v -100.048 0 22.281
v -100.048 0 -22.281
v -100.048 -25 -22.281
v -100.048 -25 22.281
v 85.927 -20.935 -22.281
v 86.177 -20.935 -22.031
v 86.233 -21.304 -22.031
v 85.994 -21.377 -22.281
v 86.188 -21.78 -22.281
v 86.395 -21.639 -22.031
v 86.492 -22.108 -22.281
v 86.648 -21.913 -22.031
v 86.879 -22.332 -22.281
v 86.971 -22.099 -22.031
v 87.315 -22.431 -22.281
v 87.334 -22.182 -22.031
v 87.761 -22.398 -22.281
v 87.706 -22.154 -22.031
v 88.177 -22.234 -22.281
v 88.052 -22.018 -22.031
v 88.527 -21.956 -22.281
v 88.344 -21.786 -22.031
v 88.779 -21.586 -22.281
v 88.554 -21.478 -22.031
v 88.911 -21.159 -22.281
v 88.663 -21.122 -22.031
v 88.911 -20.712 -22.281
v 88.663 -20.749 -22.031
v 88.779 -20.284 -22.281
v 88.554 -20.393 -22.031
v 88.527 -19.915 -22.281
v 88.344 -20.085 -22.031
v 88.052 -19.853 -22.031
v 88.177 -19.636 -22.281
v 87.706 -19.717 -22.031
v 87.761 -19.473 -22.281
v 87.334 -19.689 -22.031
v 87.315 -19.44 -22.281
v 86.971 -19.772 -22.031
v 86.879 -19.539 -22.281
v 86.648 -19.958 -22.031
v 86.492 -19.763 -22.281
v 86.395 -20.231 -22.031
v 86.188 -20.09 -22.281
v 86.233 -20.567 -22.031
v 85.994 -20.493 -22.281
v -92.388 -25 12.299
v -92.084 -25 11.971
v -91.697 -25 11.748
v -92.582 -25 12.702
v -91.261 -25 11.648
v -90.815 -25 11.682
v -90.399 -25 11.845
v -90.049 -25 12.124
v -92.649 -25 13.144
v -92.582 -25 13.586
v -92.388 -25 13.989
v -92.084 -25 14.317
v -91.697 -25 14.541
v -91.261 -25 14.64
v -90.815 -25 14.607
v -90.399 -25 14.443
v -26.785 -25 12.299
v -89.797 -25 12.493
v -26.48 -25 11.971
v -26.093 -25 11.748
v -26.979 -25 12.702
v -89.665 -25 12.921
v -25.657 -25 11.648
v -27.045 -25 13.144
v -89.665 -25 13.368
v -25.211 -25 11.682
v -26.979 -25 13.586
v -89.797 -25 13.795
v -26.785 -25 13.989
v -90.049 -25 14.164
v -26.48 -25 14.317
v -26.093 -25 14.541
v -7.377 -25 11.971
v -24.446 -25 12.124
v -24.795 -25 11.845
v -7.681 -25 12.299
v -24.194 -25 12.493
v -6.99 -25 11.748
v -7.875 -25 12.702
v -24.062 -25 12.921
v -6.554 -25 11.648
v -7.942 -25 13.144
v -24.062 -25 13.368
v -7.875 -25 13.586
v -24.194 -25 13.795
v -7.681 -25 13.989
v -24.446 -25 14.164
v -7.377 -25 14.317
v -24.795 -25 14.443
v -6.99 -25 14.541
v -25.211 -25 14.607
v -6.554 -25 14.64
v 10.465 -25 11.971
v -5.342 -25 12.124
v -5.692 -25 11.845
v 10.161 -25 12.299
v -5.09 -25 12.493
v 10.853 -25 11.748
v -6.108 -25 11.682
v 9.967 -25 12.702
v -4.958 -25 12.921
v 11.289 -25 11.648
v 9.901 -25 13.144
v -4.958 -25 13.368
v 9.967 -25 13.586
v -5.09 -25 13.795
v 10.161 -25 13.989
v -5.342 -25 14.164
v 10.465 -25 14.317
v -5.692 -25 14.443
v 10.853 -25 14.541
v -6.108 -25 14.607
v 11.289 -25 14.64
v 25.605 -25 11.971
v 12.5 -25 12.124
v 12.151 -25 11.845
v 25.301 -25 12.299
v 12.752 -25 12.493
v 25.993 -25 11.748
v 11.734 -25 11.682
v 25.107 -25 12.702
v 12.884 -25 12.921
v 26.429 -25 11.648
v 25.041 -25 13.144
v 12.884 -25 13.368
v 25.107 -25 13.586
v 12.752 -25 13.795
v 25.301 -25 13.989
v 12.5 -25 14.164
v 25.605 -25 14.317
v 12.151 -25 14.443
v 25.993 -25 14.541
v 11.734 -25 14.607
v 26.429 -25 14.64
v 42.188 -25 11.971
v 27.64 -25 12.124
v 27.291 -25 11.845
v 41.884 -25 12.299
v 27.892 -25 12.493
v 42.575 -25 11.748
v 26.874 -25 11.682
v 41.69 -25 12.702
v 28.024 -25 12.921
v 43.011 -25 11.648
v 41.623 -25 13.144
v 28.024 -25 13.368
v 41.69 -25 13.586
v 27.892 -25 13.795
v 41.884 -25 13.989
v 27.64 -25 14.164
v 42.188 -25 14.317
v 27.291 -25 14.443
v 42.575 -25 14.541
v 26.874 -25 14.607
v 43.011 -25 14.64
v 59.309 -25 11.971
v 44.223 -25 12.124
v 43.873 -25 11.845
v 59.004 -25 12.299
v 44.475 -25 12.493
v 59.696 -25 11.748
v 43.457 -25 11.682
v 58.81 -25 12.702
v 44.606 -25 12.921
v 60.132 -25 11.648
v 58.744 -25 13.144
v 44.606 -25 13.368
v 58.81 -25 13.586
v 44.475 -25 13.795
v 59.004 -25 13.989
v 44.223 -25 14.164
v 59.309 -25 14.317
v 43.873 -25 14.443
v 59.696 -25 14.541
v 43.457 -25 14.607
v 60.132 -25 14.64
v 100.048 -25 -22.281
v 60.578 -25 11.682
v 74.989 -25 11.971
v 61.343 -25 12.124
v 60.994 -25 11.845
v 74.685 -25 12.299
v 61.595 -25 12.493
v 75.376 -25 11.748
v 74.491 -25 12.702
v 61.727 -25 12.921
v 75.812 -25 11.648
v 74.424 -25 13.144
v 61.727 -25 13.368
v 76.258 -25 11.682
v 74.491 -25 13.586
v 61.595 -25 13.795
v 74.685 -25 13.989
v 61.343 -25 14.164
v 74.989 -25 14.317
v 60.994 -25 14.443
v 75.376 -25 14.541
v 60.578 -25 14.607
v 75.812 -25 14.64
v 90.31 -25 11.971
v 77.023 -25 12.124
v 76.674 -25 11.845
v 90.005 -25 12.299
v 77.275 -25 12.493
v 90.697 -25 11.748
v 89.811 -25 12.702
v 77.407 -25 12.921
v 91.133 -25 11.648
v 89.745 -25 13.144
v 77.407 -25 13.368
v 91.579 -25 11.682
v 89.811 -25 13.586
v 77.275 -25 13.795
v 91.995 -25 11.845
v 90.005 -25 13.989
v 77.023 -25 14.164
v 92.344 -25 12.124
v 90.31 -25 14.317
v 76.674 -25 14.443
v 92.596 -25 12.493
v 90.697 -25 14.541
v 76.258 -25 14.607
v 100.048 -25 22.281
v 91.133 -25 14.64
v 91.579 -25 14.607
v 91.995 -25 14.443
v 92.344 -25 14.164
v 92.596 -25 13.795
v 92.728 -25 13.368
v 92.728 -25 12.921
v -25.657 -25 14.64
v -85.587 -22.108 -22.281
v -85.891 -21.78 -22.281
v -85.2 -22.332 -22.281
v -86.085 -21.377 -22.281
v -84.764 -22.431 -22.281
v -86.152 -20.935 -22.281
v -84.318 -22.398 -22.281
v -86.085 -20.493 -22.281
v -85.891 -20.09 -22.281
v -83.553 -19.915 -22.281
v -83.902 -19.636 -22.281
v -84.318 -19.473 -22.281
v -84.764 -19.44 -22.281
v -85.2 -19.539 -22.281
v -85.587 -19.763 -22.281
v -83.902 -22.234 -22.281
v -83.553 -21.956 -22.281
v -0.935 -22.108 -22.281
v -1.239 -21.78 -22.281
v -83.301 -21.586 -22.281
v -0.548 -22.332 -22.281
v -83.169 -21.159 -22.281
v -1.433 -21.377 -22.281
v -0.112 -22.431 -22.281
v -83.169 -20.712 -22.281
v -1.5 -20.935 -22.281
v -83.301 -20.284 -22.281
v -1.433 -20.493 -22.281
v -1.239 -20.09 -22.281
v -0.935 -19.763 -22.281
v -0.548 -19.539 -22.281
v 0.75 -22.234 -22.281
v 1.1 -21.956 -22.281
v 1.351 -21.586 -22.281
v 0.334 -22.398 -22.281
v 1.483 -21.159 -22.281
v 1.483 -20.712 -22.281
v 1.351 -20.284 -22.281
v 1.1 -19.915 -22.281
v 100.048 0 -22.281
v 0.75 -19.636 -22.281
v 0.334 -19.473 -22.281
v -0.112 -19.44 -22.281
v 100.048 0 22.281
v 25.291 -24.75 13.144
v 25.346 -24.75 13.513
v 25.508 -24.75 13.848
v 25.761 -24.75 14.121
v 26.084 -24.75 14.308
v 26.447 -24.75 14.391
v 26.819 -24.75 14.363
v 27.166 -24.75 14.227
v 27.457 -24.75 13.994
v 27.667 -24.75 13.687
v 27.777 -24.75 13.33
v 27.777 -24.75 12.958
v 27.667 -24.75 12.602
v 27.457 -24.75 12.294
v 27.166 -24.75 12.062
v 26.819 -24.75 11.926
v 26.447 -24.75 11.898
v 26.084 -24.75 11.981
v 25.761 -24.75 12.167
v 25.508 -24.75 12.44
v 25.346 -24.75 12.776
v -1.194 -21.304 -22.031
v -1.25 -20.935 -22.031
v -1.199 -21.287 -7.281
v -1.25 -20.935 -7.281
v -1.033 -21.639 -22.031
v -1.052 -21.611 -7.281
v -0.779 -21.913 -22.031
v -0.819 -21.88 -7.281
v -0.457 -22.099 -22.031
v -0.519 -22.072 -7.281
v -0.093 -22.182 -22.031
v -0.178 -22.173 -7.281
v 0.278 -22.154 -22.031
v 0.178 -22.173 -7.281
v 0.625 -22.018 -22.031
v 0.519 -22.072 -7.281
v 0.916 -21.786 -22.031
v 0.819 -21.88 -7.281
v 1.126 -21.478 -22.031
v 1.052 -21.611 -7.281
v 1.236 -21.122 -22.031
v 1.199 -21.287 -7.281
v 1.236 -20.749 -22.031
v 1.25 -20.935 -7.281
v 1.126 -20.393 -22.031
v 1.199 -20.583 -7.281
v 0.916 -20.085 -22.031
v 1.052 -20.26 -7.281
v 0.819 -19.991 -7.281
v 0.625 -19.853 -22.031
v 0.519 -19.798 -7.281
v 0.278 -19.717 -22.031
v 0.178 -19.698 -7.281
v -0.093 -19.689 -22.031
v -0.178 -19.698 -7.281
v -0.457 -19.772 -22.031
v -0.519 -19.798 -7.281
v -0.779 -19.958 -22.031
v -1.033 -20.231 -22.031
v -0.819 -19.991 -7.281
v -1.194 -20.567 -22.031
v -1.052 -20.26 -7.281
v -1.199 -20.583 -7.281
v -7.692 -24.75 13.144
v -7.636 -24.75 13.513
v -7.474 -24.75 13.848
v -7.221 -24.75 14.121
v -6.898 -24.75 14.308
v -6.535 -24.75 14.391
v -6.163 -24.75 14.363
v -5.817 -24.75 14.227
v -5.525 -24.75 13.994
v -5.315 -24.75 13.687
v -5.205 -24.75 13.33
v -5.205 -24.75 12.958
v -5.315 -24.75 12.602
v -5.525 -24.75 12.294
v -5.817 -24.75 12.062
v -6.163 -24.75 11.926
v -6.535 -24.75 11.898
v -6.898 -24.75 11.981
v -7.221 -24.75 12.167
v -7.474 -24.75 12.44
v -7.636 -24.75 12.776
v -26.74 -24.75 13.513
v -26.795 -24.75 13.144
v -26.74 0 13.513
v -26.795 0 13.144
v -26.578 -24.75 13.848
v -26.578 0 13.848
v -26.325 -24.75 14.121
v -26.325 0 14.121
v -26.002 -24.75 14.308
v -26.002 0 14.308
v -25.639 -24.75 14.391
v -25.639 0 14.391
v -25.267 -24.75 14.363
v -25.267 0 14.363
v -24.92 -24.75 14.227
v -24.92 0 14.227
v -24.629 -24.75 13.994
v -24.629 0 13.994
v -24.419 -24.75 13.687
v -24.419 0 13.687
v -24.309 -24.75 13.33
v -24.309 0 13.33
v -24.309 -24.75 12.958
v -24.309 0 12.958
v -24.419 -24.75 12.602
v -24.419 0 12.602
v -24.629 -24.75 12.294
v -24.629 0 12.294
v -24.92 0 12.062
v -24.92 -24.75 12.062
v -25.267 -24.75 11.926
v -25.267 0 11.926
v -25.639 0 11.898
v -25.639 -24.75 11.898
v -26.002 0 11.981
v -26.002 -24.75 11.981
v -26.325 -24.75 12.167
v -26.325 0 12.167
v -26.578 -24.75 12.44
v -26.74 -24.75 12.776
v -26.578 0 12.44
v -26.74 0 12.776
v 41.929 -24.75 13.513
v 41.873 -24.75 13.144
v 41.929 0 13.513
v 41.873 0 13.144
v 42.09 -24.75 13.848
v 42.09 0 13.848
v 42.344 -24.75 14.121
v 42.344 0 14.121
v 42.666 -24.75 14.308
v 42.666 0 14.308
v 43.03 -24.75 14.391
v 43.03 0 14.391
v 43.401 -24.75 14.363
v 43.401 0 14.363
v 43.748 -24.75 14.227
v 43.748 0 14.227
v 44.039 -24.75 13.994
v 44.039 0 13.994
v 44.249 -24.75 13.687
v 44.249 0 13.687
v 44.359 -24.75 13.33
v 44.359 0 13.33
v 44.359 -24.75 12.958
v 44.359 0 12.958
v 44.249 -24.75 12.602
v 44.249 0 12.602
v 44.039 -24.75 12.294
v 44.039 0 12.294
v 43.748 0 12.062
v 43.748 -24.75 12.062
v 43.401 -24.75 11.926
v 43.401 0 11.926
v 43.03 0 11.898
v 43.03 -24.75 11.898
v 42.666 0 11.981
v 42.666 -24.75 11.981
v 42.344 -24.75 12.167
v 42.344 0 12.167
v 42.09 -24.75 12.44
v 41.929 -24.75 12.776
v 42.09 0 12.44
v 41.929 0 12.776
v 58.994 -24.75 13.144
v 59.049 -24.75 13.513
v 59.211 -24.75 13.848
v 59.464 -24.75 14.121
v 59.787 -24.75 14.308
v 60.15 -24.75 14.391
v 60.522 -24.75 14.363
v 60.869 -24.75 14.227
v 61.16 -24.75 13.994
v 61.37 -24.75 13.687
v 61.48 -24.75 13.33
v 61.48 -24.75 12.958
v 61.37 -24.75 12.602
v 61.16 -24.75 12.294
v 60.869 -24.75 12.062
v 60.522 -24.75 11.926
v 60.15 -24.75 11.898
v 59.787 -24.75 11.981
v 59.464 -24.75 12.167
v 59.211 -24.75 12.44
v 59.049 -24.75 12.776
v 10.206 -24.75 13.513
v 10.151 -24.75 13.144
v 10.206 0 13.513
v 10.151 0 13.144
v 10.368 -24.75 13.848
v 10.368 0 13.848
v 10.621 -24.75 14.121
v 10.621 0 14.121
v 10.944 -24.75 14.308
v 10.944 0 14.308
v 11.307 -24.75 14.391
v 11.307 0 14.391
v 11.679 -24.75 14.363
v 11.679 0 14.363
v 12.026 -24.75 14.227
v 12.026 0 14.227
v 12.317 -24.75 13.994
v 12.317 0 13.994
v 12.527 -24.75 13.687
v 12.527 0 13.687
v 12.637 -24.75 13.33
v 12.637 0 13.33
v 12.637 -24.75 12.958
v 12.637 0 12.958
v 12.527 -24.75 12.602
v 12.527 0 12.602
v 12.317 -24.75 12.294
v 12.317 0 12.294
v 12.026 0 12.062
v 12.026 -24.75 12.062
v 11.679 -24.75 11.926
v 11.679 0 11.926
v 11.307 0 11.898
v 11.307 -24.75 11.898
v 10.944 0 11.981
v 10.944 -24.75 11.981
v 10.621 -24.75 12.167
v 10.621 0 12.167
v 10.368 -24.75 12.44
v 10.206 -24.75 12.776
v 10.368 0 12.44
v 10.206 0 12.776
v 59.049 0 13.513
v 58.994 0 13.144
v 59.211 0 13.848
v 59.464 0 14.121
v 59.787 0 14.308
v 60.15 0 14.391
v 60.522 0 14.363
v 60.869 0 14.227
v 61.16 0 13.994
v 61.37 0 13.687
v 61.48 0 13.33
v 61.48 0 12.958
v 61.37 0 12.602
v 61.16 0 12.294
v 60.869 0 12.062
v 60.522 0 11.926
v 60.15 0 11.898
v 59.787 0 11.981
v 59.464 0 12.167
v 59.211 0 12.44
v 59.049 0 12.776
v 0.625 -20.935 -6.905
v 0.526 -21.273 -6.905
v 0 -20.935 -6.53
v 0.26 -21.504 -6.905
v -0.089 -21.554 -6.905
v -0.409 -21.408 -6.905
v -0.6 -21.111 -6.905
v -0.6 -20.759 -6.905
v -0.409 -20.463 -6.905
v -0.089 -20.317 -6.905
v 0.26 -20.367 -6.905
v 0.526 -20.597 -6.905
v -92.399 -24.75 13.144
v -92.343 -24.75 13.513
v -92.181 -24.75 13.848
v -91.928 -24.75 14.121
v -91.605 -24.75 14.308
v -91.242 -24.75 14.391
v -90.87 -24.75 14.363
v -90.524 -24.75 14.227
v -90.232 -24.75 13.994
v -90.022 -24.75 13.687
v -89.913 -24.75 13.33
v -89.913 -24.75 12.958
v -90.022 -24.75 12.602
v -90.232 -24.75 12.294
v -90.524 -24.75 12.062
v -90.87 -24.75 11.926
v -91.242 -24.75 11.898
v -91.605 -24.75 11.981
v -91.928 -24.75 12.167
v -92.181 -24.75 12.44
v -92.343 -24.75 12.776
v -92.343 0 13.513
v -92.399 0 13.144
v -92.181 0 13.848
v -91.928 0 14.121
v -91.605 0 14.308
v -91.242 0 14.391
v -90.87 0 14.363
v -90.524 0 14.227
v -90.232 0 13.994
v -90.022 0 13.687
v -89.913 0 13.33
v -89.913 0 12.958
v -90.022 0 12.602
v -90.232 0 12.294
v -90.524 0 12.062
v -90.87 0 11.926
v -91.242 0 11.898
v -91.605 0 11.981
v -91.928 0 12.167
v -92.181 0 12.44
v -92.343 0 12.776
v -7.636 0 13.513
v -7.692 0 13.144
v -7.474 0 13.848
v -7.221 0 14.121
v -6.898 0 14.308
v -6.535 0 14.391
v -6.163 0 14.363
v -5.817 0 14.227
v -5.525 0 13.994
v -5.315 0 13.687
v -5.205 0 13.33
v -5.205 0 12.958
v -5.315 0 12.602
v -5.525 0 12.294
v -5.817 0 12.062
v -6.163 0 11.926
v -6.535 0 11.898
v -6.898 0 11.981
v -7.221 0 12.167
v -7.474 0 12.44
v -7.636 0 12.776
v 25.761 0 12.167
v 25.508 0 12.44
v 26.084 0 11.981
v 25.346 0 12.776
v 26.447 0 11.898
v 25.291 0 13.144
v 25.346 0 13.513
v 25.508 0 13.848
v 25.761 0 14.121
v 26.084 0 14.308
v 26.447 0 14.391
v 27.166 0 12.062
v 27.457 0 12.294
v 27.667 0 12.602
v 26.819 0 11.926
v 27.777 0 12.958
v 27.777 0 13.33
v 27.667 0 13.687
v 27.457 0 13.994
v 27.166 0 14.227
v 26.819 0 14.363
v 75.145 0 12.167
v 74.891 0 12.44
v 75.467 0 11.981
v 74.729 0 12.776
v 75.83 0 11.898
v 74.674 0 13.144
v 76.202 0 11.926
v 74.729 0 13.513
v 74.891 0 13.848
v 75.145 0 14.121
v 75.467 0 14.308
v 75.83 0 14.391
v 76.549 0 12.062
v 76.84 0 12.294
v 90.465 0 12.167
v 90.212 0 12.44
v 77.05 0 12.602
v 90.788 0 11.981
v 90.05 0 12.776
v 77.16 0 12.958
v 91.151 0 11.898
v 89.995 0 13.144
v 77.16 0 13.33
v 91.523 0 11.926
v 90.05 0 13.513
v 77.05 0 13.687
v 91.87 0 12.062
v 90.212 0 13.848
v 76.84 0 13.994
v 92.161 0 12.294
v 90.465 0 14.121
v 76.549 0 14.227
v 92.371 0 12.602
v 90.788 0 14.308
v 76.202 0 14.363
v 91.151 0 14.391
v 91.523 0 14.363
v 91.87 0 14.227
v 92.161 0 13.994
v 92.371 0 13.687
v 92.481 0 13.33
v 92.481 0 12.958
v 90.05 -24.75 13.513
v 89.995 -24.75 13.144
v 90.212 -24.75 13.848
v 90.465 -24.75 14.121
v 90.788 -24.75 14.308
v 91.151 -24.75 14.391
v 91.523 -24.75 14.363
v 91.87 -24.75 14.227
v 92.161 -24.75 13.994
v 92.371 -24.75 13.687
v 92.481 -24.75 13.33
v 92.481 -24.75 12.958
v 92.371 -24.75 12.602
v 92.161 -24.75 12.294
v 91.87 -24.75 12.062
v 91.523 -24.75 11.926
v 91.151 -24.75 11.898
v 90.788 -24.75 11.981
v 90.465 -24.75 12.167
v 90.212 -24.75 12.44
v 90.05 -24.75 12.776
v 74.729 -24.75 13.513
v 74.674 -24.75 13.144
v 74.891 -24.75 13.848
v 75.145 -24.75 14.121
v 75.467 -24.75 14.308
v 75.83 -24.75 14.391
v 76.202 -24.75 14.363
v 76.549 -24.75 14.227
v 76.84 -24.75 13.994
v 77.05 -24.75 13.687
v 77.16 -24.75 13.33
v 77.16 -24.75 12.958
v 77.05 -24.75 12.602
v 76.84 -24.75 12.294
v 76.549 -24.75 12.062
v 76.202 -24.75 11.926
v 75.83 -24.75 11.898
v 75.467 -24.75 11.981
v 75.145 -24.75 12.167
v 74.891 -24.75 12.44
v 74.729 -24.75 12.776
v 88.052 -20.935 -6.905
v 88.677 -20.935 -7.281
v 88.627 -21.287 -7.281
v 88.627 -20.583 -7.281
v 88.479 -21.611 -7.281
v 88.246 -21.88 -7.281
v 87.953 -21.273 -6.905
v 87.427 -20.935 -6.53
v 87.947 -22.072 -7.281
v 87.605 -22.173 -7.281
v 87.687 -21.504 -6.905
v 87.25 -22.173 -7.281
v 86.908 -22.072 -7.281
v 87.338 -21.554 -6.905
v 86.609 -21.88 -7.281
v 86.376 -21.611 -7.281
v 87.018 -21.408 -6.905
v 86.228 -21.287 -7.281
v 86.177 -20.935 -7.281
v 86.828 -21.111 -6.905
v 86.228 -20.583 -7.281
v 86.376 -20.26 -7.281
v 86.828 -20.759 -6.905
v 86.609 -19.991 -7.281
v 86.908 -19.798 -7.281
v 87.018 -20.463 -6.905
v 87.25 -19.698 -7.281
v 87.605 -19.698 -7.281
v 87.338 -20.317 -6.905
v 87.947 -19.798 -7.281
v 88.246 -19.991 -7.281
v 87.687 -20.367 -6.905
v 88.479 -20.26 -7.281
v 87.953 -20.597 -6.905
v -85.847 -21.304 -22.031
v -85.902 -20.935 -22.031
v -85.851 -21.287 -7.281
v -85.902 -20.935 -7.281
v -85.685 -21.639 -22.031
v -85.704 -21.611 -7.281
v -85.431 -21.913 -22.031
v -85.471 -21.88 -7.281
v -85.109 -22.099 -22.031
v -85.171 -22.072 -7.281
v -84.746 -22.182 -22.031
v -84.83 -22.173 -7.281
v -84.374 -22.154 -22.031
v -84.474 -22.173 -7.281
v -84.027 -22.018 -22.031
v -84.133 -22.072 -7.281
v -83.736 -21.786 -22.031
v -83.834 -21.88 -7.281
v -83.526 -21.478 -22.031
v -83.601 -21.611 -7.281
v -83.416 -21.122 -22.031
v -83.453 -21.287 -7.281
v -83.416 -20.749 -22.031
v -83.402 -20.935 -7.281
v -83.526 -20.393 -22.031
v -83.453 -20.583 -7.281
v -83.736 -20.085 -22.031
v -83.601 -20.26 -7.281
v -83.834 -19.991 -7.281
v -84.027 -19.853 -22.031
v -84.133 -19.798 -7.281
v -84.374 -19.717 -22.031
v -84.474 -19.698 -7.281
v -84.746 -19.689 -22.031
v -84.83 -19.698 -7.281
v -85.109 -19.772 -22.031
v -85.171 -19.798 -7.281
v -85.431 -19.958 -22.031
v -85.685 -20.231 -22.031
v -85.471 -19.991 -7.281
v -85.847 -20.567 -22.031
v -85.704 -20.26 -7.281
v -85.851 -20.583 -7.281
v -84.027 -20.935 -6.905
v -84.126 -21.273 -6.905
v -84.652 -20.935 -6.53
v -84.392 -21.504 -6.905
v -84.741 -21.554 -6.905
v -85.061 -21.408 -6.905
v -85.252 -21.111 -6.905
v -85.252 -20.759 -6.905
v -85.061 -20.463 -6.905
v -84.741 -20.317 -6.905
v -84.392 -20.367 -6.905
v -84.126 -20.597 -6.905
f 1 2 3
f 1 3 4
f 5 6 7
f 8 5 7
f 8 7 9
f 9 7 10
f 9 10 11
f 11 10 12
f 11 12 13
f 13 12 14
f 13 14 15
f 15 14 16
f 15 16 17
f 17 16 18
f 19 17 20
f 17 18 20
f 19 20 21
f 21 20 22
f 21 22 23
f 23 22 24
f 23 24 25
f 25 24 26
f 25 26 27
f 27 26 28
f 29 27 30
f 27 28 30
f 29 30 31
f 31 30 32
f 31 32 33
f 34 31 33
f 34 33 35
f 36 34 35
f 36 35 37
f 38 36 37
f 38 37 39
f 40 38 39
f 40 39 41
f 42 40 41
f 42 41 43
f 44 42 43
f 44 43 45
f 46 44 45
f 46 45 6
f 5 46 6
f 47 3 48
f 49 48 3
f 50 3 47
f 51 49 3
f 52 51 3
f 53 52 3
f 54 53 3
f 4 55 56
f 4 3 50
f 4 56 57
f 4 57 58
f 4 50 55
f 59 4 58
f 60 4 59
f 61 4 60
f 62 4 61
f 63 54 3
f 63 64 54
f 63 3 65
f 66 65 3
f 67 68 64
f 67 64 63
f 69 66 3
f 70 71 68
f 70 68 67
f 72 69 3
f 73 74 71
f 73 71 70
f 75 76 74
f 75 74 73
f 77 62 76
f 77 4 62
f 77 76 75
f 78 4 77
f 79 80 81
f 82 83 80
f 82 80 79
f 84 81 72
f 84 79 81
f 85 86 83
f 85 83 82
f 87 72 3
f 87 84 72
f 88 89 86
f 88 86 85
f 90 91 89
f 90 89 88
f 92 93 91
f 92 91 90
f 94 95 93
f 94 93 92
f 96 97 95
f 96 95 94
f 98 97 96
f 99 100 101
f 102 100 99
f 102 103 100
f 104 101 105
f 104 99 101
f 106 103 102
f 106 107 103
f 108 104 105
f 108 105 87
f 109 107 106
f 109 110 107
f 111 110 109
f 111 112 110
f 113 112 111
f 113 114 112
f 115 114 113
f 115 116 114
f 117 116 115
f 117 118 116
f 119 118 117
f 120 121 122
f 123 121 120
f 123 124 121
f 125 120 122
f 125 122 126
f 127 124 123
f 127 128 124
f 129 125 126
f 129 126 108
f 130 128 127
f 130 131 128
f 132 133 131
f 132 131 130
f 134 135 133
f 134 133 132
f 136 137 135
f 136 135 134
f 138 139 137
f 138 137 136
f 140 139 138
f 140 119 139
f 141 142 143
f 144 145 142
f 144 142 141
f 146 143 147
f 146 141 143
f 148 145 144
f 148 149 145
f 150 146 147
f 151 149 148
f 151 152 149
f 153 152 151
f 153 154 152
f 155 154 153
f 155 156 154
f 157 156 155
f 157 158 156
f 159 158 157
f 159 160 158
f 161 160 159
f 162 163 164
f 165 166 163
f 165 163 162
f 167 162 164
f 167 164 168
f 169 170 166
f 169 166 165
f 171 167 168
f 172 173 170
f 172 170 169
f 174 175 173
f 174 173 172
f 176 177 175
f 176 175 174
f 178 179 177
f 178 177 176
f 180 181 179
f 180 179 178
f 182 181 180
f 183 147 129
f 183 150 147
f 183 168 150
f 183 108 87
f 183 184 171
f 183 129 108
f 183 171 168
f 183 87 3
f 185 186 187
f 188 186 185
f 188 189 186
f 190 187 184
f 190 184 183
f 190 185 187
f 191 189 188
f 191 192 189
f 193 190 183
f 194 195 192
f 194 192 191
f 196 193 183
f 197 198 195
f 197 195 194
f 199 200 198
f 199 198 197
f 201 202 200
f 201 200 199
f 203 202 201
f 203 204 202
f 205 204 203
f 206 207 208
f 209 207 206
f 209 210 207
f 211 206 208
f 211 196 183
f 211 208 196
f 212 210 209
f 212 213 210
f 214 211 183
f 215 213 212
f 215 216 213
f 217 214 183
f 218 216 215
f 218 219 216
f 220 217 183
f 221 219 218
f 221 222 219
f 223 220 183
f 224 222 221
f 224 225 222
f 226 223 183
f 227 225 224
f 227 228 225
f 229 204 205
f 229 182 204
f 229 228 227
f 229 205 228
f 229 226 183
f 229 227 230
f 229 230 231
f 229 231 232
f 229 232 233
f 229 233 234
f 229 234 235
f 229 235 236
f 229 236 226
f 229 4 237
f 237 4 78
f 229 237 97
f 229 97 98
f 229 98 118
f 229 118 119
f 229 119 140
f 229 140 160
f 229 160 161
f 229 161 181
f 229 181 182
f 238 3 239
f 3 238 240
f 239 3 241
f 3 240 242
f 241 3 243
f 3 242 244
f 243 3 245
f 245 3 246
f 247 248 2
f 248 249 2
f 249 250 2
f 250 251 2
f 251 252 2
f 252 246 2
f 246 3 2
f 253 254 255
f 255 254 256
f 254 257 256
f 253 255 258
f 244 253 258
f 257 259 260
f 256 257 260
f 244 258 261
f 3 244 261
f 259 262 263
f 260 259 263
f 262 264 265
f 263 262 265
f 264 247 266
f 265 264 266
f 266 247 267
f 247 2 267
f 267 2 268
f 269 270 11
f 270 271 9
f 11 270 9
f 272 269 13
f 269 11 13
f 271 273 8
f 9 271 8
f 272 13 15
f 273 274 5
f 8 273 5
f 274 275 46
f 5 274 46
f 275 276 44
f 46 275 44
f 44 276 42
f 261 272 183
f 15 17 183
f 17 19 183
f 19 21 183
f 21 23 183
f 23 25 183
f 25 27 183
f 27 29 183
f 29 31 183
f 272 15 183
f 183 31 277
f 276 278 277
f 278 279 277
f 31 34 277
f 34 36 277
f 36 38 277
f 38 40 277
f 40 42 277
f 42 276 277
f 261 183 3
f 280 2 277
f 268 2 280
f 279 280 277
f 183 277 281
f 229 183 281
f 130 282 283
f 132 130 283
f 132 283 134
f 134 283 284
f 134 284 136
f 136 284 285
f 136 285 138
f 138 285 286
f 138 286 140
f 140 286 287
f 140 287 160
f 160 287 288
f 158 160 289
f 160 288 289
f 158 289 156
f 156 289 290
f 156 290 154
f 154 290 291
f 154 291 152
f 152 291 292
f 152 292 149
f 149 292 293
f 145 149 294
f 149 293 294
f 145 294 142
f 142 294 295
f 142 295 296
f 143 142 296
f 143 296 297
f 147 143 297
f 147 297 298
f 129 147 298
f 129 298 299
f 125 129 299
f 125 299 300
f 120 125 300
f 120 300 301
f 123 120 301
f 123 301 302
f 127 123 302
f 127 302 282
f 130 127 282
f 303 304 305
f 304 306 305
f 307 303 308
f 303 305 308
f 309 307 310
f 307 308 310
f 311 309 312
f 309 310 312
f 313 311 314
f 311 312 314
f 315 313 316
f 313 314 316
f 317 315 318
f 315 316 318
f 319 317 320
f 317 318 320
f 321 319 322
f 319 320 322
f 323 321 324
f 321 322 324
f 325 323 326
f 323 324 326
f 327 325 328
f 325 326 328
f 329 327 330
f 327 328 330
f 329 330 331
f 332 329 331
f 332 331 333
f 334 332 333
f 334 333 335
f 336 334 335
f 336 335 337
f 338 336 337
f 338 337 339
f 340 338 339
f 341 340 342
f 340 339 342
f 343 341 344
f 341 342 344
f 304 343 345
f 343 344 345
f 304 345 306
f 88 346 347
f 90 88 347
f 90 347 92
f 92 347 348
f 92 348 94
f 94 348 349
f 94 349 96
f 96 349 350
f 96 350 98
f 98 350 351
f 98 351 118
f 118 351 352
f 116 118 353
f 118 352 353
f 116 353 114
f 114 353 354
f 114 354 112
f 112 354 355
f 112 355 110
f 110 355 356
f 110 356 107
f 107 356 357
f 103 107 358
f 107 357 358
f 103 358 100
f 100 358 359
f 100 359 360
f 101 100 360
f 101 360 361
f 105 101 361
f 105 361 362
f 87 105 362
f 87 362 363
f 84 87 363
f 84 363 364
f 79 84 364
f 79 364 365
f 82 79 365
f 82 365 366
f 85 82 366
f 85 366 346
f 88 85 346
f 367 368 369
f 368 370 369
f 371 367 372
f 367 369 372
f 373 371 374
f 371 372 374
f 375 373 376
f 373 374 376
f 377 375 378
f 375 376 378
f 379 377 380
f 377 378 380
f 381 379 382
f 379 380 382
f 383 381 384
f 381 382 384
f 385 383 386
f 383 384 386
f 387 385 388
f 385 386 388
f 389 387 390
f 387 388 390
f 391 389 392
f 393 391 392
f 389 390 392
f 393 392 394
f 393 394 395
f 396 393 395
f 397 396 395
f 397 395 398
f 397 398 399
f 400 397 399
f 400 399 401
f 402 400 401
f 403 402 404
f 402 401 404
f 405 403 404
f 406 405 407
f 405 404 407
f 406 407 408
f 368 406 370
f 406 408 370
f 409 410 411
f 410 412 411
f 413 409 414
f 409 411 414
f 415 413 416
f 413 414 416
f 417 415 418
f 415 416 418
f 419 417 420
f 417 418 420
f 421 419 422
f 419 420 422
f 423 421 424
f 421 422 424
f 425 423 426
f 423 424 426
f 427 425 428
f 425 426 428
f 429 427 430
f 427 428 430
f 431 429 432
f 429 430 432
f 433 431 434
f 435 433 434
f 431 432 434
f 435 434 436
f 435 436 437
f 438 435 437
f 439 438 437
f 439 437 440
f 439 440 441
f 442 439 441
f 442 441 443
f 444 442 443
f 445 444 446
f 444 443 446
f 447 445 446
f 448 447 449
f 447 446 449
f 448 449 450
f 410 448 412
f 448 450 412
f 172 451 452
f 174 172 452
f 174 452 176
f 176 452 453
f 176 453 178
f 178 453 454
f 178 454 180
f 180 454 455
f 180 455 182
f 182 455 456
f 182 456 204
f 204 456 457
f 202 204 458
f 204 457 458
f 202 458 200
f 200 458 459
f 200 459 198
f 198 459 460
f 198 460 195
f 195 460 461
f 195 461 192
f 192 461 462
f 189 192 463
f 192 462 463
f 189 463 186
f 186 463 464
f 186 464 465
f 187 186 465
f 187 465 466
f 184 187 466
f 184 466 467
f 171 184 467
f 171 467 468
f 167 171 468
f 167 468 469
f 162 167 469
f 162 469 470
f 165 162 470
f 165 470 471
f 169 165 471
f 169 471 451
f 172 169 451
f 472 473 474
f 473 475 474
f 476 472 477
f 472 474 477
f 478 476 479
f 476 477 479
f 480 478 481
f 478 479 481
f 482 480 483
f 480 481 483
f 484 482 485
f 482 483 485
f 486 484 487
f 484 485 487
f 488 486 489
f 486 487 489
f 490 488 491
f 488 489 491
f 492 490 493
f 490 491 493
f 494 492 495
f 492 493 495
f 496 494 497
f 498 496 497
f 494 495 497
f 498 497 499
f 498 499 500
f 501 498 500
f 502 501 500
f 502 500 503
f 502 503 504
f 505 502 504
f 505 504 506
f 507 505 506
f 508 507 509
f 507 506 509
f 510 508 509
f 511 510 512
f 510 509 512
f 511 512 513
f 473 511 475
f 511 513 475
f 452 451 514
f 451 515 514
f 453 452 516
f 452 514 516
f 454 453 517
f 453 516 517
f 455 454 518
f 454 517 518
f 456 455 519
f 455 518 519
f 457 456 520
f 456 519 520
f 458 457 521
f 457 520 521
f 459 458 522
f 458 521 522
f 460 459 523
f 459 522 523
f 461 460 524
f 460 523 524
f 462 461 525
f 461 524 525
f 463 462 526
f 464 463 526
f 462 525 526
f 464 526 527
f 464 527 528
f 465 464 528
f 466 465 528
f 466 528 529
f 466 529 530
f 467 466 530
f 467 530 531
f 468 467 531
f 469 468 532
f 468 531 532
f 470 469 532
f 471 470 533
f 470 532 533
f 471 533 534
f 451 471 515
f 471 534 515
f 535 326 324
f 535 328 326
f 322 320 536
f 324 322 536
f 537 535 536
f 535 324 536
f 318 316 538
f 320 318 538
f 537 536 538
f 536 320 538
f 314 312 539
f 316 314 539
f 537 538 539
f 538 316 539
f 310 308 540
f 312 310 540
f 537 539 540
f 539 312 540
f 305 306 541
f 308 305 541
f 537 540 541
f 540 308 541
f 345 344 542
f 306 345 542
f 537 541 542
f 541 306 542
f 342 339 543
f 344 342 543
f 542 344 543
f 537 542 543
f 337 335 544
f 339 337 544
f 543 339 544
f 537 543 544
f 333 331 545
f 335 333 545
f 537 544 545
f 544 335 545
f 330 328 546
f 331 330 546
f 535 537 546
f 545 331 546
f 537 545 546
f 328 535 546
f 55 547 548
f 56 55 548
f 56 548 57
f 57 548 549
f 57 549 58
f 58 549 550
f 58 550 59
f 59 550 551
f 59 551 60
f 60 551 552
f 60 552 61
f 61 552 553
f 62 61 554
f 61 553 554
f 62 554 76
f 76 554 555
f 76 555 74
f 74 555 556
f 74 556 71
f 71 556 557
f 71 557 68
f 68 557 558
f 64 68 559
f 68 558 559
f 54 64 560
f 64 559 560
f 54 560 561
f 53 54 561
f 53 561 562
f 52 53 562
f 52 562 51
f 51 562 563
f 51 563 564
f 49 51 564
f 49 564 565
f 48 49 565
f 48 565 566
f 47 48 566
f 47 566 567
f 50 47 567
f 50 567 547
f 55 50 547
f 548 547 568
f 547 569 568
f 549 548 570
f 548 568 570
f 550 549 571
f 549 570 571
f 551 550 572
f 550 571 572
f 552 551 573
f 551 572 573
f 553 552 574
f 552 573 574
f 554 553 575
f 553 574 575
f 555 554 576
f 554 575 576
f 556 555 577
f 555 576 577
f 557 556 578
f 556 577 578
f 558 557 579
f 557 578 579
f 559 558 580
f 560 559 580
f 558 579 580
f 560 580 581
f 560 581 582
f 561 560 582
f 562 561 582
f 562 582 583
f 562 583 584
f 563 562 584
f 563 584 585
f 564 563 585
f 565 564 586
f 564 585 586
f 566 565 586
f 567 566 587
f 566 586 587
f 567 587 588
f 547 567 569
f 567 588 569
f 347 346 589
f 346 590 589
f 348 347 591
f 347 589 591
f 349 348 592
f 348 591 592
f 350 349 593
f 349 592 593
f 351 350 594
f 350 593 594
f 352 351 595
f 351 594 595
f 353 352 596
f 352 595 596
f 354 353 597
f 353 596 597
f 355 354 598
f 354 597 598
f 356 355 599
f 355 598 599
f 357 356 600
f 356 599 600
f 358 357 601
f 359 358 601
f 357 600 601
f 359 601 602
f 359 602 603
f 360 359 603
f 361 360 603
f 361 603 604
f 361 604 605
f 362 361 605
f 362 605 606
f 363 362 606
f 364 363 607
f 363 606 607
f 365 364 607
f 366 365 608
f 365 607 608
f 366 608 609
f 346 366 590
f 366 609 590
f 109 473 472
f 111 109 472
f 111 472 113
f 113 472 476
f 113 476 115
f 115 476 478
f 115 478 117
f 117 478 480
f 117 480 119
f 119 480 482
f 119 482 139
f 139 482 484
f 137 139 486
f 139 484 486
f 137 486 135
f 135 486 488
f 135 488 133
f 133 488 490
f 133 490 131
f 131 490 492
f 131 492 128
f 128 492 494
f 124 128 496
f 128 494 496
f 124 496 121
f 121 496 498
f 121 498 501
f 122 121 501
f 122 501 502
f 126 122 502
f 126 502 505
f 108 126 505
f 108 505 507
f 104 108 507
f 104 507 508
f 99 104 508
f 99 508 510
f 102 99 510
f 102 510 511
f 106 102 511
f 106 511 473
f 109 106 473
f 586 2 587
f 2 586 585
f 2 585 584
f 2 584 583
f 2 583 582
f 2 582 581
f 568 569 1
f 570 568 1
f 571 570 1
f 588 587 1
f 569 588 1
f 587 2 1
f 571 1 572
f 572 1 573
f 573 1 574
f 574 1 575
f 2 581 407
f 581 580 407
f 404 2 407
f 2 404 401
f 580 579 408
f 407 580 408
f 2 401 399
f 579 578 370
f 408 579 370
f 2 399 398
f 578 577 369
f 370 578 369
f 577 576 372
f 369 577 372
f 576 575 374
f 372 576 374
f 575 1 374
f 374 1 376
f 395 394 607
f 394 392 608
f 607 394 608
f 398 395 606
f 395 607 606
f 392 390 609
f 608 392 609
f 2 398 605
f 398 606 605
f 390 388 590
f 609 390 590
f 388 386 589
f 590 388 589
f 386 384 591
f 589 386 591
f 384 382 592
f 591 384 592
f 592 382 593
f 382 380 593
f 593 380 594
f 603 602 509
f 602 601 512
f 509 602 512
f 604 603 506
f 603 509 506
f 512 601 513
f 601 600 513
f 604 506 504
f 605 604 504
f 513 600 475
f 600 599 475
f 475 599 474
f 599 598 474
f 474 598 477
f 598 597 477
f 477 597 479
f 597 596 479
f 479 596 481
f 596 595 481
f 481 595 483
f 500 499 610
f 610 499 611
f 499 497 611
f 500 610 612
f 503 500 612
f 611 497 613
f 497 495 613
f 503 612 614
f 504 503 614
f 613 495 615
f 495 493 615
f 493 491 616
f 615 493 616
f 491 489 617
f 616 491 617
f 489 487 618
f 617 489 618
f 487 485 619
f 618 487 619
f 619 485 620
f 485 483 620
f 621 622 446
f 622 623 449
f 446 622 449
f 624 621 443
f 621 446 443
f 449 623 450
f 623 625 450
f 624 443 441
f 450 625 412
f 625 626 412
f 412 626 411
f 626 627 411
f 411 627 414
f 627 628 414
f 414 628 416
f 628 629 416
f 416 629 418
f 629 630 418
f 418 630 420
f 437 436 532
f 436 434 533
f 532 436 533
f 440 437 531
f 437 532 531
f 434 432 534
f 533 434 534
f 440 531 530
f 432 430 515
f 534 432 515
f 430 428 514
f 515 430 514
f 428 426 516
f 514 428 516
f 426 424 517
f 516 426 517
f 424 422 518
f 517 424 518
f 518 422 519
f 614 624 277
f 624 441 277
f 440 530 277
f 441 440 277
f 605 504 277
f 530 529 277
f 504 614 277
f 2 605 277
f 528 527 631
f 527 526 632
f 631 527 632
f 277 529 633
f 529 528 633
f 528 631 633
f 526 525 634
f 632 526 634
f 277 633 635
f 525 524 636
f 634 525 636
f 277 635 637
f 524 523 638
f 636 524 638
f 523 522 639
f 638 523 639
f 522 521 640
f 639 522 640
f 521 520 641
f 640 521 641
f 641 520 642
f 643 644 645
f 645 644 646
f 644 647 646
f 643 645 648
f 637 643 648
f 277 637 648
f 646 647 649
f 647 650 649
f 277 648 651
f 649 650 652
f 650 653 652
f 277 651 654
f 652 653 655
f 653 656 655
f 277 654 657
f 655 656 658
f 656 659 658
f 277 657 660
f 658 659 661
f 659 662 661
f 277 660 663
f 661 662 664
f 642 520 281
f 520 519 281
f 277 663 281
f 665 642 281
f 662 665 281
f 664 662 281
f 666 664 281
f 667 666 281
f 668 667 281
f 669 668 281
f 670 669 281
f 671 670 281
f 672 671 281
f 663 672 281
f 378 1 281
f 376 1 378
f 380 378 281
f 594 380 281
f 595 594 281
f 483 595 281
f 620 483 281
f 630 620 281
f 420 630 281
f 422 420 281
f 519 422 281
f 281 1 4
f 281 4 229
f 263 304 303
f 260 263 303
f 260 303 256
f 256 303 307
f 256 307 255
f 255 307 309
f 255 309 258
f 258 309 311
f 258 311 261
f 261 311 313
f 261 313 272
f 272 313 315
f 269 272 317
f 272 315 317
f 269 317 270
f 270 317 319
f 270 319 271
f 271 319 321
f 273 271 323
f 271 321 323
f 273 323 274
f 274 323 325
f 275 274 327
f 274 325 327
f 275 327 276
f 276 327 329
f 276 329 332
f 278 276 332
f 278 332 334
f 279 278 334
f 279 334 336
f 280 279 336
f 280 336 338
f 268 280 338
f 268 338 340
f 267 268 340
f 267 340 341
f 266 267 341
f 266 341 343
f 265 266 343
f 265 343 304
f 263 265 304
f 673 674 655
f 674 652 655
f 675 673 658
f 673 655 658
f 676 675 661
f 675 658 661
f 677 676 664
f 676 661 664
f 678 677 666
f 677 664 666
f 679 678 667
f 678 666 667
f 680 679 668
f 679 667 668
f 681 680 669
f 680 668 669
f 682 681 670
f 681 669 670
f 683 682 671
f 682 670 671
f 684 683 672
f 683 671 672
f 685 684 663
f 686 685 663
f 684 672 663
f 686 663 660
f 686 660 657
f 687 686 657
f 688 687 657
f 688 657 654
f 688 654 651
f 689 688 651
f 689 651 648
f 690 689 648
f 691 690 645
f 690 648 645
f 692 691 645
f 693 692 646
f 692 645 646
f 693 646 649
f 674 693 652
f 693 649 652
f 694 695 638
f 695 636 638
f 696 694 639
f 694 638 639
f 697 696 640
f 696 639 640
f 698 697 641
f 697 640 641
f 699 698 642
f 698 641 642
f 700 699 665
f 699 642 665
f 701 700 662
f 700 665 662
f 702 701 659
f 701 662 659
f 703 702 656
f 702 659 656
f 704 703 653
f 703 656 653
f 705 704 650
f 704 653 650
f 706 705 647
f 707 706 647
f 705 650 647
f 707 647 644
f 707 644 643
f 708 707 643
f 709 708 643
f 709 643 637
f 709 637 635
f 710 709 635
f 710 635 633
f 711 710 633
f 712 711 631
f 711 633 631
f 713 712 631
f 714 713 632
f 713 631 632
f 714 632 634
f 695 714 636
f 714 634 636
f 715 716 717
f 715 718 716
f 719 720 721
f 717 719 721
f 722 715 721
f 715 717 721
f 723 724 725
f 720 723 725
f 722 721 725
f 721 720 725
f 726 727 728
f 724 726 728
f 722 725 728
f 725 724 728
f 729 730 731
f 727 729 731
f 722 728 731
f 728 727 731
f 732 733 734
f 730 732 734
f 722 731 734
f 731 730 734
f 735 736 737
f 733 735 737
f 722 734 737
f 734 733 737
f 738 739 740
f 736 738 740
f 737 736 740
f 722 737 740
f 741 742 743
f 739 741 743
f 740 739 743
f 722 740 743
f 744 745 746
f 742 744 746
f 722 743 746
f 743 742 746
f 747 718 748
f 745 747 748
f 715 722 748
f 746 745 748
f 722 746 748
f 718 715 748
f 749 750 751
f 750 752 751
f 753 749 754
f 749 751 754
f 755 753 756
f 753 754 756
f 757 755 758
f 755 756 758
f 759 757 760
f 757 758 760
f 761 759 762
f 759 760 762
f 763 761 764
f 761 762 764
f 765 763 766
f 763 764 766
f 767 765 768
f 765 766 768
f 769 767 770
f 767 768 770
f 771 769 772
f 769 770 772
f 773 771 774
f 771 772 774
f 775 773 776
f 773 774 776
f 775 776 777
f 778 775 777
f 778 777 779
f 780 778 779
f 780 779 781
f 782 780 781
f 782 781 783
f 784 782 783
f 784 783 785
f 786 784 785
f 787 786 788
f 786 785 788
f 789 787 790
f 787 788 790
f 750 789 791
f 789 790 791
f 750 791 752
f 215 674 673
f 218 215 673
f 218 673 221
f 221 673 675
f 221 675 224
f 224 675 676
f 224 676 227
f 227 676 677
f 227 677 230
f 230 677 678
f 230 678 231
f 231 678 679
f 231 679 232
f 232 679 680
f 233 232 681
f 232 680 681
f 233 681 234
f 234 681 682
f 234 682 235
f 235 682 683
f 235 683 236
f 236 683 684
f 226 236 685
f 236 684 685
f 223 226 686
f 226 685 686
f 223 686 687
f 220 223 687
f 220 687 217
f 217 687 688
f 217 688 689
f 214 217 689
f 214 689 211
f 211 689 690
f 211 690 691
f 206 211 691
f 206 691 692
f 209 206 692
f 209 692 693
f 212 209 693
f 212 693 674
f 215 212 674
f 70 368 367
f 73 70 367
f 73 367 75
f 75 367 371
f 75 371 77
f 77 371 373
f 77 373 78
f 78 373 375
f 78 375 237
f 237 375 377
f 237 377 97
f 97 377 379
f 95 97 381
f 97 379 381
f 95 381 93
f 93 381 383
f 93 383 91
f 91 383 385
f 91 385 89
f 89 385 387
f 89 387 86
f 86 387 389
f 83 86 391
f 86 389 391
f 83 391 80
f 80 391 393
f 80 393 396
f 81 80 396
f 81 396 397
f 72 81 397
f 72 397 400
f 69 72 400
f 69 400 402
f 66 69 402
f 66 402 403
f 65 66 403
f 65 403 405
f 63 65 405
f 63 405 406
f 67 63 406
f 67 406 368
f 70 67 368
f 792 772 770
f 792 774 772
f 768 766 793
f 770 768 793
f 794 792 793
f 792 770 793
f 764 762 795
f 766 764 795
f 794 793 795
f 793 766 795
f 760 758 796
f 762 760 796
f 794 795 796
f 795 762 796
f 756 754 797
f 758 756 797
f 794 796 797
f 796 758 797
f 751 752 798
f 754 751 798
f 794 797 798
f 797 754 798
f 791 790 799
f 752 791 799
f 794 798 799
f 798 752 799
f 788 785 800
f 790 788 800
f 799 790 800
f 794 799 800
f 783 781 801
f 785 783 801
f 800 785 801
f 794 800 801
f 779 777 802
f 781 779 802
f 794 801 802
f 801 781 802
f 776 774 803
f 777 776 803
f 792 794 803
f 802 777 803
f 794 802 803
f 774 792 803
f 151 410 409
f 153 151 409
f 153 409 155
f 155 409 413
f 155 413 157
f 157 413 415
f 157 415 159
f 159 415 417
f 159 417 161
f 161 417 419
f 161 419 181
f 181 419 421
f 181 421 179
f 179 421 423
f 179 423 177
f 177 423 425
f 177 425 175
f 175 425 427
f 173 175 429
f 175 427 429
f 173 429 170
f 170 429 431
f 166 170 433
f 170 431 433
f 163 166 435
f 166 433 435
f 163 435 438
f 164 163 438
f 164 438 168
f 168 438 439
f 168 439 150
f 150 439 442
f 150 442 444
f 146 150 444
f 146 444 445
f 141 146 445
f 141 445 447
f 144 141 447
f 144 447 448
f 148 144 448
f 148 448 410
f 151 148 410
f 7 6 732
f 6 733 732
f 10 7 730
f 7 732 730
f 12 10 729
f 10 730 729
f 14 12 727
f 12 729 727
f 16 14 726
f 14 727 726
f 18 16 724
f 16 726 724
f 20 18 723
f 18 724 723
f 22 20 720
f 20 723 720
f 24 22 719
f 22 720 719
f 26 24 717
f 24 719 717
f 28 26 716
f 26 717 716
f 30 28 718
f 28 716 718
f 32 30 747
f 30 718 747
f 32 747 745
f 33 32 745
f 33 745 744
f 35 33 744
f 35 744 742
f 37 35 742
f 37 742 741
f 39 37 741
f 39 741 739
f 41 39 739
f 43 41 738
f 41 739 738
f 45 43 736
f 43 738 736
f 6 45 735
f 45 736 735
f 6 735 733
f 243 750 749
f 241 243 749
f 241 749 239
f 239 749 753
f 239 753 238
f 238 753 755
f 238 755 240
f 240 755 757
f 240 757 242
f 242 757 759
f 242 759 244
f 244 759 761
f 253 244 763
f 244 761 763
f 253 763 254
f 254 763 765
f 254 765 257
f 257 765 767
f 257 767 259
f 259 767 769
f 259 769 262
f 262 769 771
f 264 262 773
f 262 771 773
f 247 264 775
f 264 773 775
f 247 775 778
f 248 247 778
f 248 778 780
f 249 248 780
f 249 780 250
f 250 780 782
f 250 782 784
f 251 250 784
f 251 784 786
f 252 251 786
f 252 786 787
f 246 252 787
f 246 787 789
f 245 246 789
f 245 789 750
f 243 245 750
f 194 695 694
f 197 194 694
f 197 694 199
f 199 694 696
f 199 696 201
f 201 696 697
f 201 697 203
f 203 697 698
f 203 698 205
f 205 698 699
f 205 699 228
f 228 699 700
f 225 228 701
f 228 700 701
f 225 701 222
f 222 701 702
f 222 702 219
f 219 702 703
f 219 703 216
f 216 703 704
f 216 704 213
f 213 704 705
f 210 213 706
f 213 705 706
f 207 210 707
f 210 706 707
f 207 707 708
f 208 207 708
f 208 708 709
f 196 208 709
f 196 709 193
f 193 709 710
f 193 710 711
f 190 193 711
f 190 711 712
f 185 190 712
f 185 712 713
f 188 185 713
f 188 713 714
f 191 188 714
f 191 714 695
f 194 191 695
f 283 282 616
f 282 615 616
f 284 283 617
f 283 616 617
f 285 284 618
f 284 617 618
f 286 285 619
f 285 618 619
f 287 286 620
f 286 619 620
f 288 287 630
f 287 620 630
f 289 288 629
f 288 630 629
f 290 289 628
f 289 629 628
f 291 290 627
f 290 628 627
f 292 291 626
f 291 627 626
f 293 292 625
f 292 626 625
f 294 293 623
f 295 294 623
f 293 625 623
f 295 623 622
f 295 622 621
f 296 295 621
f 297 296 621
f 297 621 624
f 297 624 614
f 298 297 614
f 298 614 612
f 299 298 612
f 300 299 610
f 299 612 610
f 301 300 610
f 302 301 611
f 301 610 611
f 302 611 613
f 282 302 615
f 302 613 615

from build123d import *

# Parameters (mm, degrees)
F0_W           = 200.0950425863
F0_H           = 44.5620156825
F1_DEPTH       = 25
F3_D           = 2.5
F3_CSINK_D     = 3
F3_CSINK_ANGLE = 90
F5_D           = 2.5
F5_DEPTH       = 15
F5_CSINK_D     = 3
F5_CSINK_ANGLE = 90
F5_TIP         = 0.7510757738


with BuildPart() as f1:
    # F0 (on Front) → F1 (new body)
    with BuildSketch(Plane.XZ):
        Rectangle(F0_W, F0_H)
    extrude(amount=F1_DEPTH)

    # F3 (through all)
    with Locations(Plane.XZ.offset(25)):
        with Locations((-91.1486074328, 13.1441922858), (-25.5451947451, 13.1441922858), (-6.4415293746, 13.1441922858), (11.4006157964, 13.1441922858), (26.5406873077, 13.1441922858), (43.1231148541, 13.1441922858), (60.2437853813, 13.1441922858), (75.9239122272, 13.1441922858), (91.2448167801, 13.1441922858)):
            CounterSinkHole(F3_D / 2, F3_CSINK_D / 2, counter_sink_angle=F3_CSINK_ANGLE)

    # F5
    with Locations(Plane(origin=(0, 0, -22.2810078412), x_dir=(1, 0, 0), z_dir=(0, 0, -1))):
        with Locations((87.427444756, 20.9353156388), (0, 20.9353156388), (-84.652133286, 20.9353156388)):
            CounterSinkHole(F5_D / 2, F5_CSINK_D / 2, depth=F5_DEPTH, counter_sink_angle=F5_CSINK_ANGLE)
            with Locations((0, 0, -(F5_DEPTH + F5_TIP / 2))):  # 118° drill point
                Cone(0, F5_D / 2, F5_TIP, mode=Mode.SUBTRACT)


solid = f1.part
